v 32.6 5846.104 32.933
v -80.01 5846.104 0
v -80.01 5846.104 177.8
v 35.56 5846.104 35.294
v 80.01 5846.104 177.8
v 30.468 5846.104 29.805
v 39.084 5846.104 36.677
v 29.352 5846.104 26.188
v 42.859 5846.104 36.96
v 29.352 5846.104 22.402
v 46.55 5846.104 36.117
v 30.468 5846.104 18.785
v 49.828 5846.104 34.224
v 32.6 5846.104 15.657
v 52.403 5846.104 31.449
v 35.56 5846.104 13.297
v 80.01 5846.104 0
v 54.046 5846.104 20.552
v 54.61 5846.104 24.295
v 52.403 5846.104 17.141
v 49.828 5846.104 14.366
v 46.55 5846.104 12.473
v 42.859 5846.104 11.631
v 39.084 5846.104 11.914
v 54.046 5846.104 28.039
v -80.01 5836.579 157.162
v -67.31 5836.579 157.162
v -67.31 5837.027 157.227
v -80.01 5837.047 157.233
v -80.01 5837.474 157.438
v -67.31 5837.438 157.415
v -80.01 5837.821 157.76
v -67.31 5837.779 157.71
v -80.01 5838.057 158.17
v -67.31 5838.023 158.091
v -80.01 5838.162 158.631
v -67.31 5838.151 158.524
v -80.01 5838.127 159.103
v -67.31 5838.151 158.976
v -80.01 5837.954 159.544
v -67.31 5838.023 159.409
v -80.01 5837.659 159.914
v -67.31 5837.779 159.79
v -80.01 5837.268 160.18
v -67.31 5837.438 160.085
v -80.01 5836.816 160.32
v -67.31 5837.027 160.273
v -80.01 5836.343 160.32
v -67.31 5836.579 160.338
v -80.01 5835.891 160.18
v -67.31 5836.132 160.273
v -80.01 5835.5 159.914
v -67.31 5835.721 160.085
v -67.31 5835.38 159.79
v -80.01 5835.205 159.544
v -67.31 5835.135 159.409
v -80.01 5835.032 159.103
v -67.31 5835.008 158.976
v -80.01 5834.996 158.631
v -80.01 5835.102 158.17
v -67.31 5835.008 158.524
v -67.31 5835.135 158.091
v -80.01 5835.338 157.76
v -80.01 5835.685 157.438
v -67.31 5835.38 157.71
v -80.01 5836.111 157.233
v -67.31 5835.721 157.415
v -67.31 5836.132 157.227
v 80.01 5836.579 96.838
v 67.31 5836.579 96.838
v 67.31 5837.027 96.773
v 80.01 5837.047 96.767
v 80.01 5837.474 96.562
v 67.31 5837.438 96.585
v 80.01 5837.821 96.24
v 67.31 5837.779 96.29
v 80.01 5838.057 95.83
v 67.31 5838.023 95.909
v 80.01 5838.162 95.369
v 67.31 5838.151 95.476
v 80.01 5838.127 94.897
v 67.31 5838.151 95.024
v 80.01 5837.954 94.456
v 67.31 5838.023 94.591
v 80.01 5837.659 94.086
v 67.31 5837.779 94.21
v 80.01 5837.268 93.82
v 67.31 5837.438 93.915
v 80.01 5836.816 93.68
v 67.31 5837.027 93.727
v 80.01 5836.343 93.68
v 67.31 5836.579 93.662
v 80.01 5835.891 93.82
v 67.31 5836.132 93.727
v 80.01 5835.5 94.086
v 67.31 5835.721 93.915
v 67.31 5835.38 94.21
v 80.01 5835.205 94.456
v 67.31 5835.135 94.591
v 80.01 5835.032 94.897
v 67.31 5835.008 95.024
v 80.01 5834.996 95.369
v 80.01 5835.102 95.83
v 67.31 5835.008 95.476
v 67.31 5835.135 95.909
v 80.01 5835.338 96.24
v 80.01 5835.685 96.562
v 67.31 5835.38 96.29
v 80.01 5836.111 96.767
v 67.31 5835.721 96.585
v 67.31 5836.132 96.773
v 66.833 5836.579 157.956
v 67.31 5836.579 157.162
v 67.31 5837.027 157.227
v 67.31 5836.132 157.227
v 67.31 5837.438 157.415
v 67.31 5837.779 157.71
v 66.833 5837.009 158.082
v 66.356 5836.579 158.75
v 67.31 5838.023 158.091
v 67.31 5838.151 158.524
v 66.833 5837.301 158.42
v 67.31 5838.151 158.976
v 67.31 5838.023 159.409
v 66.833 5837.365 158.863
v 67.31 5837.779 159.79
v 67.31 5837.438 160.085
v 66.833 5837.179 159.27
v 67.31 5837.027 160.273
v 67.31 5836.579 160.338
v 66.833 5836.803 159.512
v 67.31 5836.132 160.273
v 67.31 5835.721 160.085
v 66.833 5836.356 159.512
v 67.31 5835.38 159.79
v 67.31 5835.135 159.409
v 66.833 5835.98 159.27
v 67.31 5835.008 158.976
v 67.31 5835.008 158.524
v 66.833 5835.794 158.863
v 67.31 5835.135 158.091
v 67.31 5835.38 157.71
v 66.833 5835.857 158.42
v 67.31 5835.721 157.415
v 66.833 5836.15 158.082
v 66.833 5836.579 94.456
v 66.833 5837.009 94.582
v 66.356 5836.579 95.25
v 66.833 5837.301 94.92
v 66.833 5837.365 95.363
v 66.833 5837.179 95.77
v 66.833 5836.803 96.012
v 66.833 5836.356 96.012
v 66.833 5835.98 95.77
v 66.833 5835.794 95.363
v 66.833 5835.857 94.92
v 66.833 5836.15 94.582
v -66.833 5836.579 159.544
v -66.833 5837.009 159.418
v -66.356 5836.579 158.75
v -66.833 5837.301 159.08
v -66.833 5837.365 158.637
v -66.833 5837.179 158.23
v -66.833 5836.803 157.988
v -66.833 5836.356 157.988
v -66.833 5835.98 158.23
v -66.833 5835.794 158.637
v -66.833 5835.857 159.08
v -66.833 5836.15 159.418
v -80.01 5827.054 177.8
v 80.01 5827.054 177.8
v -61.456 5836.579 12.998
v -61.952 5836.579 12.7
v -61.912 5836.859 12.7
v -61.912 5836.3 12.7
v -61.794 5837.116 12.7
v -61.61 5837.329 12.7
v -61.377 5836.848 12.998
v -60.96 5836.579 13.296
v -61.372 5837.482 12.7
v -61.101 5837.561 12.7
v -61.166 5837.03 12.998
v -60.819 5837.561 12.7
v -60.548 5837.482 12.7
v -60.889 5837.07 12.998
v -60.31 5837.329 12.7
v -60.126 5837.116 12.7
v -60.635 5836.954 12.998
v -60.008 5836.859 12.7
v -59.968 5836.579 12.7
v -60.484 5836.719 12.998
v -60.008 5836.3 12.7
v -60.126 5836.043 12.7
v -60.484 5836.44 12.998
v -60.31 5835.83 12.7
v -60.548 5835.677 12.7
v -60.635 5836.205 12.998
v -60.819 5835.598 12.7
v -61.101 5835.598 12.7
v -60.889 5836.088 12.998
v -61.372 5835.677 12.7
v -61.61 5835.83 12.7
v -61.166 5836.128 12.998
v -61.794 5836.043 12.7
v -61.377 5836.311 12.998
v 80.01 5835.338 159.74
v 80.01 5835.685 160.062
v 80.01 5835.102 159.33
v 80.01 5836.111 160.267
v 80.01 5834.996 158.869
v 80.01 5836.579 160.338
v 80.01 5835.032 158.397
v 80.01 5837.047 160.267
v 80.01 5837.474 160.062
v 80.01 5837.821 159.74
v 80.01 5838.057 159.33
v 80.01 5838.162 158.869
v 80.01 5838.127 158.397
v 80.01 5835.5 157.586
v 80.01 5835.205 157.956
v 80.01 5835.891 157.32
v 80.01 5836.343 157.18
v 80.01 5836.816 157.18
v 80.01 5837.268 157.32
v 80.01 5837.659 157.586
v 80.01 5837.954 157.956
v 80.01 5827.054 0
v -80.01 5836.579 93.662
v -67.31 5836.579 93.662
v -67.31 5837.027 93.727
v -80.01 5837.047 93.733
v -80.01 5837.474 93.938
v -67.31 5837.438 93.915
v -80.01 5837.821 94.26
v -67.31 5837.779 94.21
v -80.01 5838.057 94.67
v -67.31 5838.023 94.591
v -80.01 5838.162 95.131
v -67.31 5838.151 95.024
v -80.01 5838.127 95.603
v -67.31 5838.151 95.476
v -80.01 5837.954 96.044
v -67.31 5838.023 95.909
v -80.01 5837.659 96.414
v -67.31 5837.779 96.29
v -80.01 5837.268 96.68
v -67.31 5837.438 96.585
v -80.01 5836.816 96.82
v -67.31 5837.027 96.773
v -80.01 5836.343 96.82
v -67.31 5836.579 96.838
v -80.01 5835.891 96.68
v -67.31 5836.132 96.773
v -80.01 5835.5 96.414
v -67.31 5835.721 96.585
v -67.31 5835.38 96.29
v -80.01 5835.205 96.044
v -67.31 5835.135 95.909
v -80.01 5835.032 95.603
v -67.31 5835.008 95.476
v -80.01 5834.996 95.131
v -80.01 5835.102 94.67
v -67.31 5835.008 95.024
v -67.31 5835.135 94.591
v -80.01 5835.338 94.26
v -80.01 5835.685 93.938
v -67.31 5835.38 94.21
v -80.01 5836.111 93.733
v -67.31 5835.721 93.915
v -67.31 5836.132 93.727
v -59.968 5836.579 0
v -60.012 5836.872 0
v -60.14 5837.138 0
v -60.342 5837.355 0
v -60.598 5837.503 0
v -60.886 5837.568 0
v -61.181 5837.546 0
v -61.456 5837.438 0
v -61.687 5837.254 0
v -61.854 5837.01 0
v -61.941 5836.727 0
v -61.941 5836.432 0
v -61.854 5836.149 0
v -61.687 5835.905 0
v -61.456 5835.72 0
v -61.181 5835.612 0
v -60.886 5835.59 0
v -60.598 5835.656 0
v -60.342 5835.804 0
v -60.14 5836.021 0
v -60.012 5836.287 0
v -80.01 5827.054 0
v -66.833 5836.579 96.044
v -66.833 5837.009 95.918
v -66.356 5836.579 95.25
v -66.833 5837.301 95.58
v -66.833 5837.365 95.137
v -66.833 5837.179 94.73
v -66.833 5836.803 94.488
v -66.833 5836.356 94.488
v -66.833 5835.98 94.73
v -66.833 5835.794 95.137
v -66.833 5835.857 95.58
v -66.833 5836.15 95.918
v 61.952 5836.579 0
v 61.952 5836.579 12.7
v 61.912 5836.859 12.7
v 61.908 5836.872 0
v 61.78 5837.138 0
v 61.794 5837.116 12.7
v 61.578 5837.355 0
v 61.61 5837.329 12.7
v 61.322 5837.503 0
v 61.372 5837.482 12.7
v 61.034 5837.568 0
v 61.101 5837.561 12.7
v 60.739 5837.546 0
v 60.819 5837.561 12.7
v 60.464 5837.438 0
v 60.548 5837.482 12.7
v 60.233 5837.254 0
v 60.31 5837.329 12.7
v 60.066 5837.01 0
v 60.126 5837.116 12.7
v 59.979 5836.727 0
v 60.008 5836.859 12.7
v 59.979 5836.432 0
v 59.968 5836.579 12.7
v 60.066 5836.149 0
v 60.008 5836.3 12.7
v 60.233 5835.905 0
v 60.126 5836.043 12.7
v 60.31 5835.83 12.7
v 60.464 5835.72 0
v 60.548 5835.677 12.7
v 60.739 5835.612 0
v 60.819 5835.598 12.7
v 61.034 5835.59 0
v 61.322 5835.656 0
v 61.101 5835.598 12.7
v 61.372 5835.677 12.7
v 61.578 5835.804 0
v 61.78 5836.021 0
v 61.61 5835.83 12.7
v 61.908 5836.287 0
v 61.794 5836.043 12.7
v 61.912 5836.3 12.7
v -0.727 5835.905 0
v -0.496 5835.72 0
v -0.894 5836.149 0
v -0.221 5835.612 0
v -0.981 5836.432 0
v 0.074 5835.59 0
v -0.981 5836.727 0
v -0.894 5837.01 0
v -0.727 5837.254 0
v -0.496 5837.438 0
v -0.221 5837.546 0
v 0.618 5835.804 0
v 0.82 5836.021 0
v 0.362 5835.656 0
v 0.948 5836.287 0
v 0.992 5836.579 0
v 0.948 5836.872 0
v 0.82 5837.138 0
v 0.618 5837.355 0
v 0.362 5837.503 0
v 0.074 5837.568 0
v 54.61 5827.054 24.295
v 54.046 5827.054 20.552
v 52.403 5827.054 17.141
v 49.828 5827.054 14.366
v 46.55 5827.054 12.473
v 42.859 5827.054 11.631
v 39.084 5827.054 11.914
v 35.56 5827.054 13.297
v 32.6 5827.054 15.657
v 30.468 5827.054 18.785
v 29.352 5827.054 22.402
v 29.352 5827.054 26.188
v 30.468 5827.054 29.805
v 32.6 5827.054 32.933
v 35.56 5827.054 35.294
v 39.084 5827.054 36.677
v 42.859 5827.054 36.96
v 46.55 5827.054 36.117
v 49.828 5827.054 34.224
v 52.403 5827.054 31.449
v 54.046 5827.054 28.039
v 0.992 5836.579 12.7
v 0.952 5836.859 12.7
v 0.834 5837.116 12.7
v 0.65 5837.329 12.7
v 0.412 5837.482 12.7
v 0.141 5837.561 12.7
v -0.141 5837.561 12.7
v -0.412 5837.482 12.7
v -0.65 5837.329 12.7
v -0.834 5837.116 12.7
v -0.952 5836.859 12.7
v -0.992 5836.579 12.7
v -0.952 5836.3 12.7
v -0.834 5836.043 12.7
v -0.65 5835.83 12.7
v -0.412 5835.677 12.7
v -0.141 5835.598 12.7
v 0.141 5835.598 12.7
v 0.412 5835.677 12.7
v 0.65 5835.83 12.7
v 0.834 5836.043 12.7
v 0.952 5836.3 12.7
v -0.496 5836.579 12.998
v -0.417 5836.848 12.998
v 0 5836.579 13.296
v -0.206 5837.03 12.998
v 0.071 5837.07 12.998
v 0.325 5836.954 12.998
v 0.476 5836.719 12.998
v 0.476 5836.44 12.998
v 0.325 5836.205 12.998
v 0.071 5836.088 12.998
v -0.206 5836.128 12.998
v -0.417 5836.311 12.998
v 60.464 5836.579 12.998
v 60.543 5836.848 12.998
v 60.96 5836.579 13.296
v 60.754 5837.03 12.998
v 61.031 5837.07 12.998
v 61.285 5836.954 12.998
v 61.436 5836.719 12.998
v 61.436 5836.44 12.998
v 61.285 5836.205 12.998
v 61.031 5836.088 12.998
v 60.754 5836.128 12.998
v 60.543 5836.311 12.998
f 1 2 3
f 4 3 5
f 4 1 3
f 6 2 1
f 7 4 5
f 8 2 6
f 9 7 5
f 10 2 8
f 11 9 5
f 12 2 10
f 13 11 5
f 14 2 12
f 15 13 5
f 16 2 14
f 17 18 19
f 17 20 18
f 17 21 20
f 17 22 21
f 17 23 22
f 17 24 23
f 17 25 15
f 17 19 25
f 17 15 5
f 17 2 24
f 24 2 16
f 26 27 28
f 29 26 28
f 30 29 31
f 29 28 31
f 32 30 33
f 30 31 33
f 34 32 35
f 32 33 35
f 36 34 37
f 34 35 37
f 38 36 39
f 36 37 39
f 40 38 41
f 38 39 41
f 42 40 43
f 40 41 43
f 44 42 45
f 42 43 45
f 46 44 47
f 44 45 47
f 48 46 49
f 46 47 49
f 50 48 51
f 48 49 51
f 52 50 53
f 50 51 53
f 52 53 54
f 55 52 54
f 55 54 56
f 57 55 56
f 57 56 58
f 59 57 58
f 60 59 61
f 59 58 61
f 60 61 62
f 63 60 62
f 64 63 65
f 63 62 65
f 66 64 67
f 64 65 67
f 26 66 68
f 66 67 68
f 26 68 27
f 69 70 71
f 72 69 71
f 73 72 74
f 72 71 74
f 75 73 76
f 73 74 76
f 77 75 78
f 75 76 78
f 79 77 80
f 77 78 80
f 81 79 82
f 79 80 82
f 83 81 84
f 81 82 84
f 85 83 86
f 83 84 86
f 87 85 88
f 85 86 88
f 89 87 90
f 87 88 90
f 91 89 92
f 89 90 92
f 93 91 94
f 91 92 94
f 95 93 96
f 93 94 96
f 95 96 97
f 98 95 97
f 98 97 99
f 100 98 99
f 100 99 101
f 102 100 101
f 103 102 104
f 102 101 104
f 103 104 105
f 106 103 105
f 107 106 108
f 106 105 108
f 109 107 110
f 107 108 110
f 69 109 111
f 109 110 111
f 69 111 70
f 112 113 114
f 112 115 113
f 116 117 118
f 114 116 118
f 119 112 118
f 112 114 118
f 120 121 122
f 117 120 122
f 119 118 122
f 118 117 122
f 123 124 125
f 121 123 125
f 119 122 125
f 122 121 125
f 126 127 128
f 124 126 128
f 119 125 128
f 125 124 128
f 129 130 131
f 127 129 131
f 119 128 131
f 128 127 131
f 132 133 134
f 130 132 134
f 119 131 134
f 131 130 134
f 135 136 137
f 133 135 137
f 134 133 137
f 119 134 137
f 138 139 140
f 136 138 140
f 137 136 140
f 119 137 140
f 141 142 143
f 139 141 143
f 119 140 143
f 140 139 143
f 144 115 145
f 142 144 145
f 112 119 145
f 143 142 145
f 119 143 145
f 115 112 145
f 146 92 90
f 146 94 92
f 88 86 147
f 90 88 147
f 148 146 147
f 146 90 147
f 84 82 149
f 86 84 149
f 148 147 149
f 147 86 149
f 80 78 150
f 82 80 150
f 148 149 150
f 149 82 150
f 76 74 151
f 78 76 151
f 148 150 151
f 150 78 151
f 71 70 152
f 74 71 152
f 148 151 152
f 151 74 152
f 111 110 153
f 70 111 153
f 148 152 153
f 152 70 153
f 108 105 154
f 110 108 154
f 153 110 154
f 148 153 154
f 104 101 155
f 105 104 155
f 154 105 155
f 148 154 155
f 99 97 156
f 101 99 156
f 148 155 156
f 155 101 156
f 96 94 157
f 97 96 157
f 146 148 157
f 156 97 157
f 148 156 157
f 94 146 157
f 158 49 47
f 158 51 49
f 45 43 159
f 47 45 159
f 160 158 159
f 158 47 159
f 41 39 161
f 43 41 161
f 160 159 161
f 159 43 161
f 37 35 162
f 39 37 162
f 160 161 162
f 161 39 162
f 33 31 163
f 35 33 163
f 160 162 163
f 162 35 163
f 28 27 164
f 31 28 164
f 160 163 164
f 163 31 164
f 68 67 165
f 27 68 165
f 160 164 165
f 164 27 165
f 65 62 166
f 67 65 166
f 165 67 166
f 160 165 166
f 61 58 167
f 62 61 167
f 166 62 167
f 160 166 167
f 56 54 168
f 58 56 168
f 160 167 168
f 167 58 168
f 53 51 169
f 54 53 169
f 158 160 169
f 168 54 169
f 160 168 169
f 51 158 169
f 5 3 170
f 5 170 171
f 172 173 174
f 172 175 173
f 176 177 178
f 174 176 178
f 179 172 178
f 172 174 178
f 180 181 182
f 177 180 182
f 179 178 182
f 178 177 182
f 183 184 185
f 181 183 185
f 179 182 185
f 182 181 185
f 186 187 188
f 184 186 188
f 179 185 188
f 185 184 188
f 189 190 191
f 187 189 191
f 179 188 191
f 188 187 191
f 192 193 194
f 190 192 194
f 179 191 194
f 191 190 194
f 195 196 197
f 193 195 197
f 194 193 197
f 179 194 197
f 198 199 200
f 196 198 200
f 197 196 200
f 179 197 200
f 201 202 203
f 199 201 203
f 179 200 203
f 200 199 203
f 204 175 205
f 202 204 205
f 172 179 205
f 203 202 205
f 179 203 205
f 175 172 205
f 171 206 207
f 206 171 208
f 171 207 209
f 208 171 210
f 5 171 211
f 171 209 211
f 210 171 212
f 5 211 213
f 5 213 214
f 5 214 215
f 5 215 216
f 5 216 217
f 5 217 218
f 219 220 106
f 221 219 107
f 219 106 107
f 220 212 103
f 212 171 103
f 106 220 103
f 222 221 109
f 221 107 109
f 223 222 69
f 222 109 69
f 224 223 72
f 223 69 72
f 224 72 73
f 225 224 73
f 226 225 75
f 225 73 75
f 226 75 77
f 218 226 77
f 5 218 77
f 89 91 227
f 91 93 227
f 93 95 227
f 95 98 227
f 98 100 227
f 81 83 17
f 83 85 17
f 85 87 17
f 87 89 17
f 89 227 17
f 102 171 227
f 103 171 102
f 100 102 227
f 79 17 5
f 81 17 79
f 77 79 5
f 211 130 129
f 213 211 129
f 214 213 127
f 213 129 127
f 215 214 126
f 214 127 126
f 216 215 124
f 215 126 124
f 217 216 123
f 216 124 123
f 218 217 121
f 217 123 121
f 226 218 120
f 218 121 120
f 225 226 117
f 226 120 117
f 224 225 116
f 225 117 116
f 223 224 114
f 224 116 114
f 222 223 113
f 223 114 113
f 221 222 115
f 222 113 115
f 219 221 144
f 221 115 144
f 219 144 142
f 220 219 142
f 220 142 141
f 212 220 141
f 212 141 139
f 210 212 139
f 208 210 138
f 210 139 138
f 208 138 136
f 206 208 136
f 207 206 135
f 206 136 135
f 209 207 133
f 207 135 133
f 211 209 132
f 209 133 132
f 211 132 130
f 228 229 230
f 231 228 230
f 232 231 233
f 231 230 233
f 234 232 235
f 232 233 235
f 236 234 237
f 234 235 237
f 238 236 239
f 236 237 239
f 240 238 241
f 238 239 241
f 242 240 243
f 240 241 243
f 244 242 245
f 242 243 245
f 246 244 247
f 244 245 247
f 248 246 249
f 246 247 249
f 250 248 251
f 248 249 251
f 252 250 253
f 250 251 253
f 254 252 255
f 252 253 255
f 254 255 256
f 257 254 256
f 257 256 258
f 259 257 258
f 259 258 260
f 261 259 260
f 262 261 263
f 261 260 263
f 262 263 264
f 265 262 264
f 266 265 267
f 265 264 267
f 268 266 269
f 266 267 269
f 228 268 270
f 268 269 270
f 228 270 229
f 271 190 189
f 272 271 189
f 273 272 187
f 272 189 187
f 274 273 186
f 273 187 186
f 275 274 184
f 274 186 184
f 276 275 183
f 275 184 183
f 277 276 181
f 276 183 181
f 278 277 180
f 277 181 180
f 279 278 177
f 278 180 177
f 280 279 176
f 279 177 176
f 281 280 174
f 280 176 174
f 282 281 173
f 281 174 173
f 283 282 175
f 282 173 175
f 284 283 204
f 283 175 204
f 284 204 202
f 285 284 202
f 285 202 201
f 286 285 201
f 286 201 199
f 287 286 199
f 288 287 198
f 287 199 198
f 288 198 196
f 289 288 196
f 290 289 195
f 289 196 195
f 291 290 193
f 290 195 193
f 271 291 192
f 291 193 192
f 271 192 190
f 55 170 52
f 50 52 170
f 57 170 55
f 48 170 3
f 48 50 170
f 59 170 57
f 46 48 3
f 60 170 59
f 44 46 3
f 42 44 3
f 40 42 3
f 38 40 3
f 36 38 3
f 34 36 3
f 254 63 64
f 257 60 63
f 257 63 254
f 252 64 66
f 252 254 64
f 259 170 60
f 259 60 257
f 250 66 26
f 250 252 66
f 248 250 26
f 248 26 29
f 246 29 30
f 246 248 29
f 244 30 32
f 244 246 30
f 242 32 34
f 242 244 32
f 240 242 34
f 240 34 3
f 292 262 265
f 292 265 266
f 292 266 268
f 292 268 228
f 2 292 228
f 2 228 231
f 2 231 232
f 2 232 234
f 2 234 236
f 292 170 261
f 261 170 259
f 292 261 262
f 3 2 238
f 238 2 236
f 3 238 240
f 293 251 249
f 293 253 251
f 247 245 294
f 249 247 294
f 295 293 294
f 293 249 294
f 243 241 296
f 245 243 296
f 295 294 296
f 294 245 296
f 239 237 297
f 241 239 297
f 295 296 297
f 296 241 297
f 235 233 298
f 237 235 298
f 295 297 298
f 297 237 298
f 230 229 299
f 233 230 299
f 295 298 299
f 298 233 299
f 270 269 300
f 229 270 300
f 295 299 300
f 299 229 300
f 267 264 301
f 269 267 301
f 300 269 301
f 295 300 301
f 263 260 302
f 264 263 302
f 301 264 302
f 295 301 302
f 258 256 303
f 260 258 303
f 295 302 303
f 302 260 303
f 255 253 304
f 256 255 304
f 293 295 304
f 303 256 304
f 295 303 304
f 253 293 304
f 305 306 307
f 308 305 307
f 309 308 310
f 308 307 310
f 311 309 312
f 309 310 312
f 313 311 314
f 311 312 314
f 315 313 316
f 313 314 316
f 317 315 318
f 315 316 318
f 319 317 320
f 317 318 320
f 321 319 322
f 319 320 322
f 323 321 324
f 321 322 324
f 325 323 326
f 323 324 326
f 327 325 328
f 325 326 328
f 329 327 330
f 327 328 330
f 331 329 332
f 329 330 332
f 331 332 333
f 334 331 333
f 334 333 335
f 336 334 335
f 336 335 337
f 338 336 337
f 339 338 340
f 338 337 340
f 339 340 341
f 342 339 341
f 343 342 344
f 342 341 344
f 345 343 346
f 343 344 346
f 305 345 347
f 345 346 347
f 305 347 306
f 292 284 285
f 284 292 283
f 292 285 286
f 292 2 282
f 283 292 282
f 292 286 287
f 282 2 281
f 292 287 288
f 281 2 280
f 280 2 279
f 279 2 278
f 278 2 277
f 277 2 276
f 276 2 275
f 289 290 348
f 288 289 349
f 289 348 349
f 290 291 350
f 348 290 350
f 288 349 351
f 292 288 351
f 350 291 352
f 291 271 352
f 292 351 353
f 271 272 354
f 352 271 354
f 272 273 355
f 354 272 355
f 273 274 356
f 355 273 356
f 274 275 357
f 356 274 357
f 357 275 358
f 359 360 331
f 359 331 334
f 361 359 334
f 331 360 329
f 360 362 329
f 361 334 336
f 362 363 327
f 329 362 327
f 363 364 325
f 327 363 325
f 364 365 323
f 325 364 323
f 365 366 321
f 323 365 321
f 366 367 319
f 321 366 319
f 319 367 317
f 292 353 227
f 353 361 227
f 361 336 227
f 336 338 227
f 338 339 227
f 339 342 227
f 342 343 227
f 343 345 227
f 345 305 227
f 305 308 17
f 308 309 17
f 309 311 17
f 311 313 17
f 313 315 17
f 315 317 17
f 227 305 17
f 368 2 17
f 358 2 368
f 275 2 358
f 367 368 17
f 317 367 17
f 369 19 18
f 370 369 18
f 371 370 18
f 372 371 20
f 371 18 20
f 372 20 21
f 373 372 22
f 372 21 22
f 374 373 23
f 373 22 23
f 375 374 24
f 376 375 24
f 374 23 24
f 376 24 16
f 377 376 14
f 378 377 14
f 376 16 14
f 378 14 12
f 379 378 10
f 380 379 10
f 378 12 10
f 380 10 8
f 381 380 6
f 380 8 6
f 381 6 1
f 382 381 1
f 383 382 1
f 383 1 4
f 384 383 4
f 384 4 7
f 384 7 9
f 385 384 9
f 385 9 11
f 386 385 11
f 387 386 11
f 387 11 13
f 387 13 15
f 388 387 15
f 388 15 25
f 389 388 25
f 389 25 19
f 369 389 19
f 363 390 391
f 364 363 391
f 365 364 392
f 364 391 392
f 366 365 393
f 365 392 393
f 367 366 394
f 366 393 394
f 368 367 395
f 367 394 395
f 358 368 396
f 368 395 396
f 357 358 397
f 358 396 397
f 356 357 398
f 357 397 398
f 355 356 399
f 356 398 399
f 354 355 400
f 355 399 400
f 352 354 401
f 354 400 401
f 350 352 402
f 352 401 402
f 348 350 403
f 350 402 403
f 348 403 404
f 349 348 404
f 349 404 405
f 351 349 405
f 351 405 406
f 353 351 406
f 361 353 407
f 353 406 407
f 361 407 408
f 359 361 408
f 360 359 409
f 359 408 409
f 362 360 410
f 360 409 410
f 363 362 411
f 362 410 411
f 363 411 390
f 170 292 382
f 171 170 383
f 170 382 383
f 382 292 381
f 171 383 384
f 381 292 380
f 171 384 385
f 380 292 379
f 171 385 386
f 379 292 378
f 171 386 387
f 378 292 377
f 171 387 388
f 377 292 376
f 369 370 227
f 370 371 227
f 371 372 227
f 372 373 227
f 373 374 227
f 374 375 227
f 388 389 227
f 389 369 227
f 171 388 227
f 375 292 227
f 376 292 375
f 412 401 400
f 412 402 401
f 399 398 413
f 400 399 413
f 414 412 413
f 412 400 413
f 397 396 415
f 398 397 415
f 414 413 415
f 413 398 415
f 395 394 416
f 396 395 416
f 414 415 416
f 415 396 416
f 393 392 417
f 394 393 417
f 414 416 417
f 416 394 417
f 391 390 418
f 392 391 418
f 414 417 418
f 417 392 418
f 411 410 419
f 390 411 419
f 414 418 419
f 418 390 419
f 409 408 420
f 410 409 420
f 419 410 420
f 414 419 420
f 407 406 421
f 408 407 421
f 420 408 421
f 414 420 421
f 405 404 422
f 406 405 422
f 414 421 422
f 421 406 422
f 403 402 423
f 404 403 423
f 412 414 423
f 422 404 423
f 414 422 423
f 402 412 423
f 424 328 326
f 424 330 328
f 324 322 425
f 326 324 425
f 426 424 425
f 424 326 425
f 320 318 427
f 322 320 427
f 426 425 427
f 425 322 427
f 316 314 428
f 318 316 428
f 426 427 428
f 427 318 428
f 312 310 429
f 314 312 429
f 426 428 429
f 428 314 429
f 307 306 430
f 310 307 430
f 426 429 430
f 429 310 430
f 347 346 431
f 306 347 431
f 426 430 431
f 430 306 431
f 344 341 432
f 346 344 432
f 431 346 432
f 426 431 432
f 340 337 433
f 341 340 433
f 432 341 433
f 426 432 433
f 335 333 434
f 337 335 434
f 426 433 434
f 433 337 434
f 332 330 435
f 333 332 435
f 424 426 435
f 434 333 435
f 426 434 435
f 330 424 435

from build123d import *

# Parameters (mm, degrees)
SKETCH1_W                  = 160.02
SKETCH1_H                  = 19.05
BOSS_EXTRUDE1_DEPTH        = 177.8
HOLE1_D                    = 1.98374
HOLE1_DEPTH                = 31.75
HOLE1_CSINK_D              = 10.16
HOLE1_CSINK_ANGLE          = 82
HOLE1_TIP                  = 0.595975622
HOLE3_D                    = 3.175
HOLE3_DEPTH                = 31.75
HOLE3_CSINK_D              = 10.16
HOLE3_CSINK_ANGLE          = 82
HOLE3_TIP                  = 0.953866233
HOLE4_D                    = 3.175
HOLE4_DEPTH                = 31.75
HOLE4_CSINK_D              = 10.16
HOLE4_CSINK_ANGLE          = 82
HOLE4_TIP                  = 0.953866233
F_1_1_DIAMETER_HOLE1_D     = 25.4
F_1_1_DIAMETER_HOLE1_DEPTH = 19.05


with BuildPart() as part:
    # Sketch1 → Boss-Extrude1 (new body)
    with BuildSketch(Plane.XY):
        with Locations((0, 5836.579380546)):
            Rectangle(SKETCH1_W, SKETCH1_H)
    extrude(amount=BOSS_EXTRUDE1_DEPTH)

    # Hole1
    with Locations(Plane(origin=(0, 0, -19.05), x_dir=(-1, 0, 0), z_dir=(0, 0, -1))):
        with Locations((0.162188158, 5756.275), (0, 5926.455000144), (-203.2, 5926.455000144), (-406.4, 5926.455000144), (-406.562188158, 5756.275), (-203.362188158, 5756.275), (-359.617959774, 5737.225), (-428.613879322, 5737.225), (-421.257783583, 5578.475), (-319.657783583, 5578.475), (-116.457783583, 5578.475), (-424.072610901, 5559.425), (-358.104203634, 5559.425), (-418.230271303, 5400.675), (-316.630271303, 5400.675), (-113.430271303, 5400.675), (-419.531342481, 5381.625), (-356.590447494, 5381.625), (-415.202759023, 5222.875), (-313.602759023, 5222.875), (-110.402759023, 5222.875), (-414.990074061, 5203.825), (-355.076691354, 5203.825), (355.076691354, 5203.825), (414.990074061, 5203.825), (110.402759023, 5222.875), (313.602759023, 5222.875), (415.202759023, 5222.875), (356.590447494, 5381.625), (419.531342481, 5381.625), (113.430271303, 5400.675), (316.630271303, 5400.675), (418.230271303, 5400.675), (358.104203634, 5559.425), (424.072610901, 5559.425), (116.457783583, 5578.475), (319.657783583, 5578.475), (421.257783583, 5578.475), (428.613879322, 5737.225), (359.617959774, 5737.225), (203.362188158, 5756.275), (406.562188158, 5756.275), (406.4, 5926.455000144), (203.2, 5926.455000144), (-0.162188158, 5756.275), (0, 5836.579380546), (-60.96, 5836.579380546), (60.96, 5836.579380546)):
            CounterSinkHole(HOLE1_D / 2, HOLE1_CSINK_D / 2, depth=HOLE1_DEPTH, counter_sink_angle=HOLE1_CSINK_ANGLE)
            with Locations((0, 0, -(HOLE1_DEPTH + HOLE1_TIP / 2))):  # 118° drill point
                Cone(0, HOLE1_D / 2, HOLE1_TIP, mode=Mode.SUBTRACT)

    # Hole3
    with Locations(Plane(origin=(99.06, 0, -2683.51), x_dir=(0, 0, -1), z_dir=(1, 0, 0))):
        with Locations((-2778.76, 5836.579380546), (-2842.26, 5836.579380546)):
            CounterSinkHole(HOLE3_D / 2, HOLE3_CSINK_D / 2, depth=HOLE3_DEPTH, counter_sink_angle=HOLE3_CSINK_ANGLE)
            with Locations((0, 0, -(HOLE3_DEPTH + HOLE3_TIP / 2))):  # 118° drill point
                Cone(0, HOLE3_D / 2, HOLE3_TIP, mode=Mode.SUBTRACT)

    # Hole4
    with Locations(Plane(origin=(-99.06, 0, -2683.51), x_dir=(0, 0, 1), z_dir=(-1, 0, 0))):
        with Locations((2778.76, 5836.579380546), (2842.26, 5836.579380546)):
            CounterSinkHole(HOLE4_D / 2, HOLE4_CSINK_D / 2, depth=HOLE4_DEPTH, counter_sink_angle=HOLE4_CSINK_ANGLE)
            with Locations((0, 0, -(HOLE4_DEPTH + HOLE4_TIP / 2))):  # 118° drill point
                Cone(0, HOLE4_D / 2, HOLE4_TIP, mode=Mode.SUBTRACT)

    # 1 (1) Diameter Hole1
    with Locations(Plane(origin=(0, 5827.054380546, 0), x_dir=(-1, 0, 0), z_dir=(0, -1, 0))):
        with Locations((-41.91, -24.295160427)):
            Hole(F_1_1_DIAMETER_HOLE1_D / 2, depth=F_1_1_DIAMETER_HOLE1_DEPTH)


solid = part.part
